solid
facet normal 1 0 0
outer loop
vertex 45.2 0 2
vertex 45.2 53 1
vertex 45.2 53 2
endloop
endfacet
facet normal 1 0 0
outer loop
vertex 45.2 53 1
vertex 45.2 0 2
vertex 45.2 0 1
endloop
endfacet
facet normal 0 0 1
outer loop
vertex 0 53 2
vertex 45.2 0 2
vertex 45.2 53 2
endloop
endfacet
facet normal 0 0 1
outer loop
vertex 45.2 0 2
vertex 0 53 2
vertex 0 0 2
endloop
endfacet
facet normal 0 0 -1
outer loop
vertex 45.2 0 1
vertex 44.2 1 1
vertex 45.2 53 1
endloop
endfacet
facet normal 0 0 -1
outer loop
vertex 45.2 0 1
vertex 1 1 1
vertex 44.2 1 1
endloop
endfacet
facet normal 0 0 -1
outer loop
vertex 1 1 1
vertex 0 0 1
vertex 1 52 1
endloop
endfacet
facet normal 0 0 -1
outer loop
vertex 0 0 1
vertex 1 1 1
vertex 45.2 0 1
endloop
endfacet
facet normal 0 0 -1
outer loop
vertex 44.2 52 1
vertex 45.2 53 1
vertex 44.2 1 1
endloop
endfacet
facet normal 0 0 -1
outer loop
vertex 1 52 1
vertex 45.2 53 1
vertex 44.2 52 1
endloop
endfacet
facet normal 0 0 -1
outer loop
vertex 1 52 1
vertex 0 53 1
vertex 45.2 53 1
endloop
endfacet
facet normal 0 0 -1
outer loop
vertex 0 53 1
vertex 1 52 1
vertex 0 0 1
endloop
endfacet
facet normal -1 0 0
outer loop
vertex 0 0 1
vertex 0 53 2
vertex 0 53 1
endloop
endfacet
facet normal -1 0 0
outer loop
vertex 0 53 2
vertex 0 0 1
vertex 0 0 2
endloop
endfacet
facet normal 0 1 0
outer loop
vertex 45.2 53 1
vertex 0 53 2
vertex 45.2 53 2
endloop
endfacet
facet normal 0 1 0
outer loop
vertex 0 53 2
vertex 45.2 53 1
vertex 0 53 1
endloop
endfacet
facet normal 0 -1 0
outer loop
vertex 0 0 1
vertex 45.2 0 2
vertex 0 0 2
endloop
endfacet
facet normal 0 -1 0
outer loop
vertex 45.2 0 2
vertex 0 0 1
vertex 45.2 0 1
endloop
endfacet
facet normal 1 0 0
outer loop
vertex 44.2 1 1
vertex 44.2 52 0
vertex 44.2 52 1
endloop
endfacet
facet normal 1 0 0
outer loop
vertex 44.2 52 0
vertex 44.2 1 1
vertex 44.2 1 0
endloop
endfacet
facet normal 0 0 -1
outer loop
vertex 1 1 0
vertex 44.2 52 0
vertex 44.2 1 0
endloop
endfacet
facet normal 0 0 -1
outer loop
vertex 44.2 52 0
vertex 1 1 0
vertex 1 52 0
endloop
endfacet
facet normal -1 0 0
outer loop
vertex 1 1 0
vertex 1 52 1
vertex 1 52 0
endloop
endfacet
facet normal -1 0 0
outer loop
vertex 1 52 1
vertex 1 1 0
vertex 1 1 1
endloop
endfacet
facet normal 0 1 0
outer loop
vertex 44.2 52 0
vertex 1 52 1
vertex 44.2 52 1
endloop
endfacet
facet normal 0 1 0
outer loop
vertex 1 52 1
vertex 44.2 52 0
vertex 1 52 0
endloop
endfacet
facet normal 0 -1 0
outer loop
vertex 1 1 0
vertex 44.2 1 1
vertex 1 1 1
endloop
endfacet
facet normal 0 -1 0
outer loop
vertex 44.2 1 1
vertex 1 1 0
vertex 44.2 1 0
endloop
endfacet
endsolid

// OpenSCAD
aa_diameter = 14.2;
aa_len = 50.5;

thickness = 1;

interior_width = (aa_diameter+.2)*3;
interior_len = aa_len + .5;
box_width = 2*thickness + interior_width;
box_len = 2*thickness + interior_len;
box_height = aa_diameter+2;

font = "Henny Penny";

// https://github.com/JustinSDK/dotSCAD/blob/master/src/box_extrude.scad
module box_extrude(height, shell_thickness) {
    linear_extrude(shell_thickness)
        children();

    linear_extrude(height)
        difference() {
            children();
            offset(delta = -shell_thickness)
                children();
        }
}

module name() {
    linear_extrude(.3) text("Joselyn", font=font, size=8, valign="center", halign="center");
}

module bottom() {
    box_extrude(box_height, thickness)
        square([box_width, box_len]);

    translate([box_width/2, 0, box_height/2]) rotate([90]) name();
    translate([box_width/2, box_len, box_height/2]) rotate([90, 0, 180]) name();
    translate([box_width, box_len/2, box_height/2]) rotate([90, 0, 90]) name();
    translate([0, box_len/2, box_height/2]) rotate([90, 0, 270]) name();
}

module lid() {
   iw = 30;
   translate([0, 0, thickness]) cube([box_width, box_len, thickness]);
   translate([(box_width-interior_width)/2, (box_len-interior_len)/2, 0]) cube([interior_width, interior_len, thickness]);
   translate([(box_width/2)-(iw/2), (box_len/2)-(iw/2), thickness/2]) resize([iw, iw, thickness*2])  surface(file="hibiscus-small.png");
}

// bottom();
lid();
